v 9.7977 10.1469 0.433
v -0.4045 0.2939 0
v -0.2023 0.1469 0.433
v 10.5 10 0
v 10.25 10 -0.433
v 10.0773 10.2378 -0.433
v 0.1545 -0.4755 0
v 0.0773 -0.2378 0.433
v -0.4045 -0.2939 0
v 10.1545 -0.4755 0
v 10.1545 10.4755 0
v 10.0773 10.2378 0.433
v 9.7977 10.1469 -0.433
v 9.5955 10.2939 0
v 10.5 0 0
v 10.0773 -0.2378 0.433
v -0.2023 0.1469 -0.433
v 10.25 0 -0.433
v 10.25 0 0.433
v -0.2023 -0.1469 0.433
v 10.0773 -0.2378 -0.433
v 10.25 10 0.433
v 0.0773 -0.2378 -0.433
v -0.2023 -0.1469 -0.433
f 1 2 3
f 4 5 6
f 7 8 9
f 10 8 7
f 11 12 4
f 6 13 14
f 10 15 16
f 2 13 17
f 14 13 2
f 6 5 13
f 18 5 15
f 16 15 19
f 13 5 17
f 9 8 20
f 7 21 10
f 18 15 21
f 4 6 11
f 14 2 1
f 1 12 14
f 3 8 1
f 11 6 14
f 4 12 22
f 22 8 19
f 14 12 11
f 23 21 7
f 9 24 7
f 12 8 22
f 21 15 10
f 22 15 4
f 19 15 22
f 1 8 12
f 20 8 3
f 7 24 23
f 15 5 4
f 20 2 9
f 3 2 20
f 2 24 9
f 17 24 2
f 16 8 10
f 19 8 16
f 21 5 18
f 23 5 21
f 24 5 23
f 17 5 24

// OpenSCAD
$fn=5;
hull()
{
	translate([0,0,0])
	{
		rotate(0,[0,0,1])
		{
			sphere(d=1);
		}
	}
	translate([10,0,0])
	{
		rotate(0,[0,0,1])
		{
			sphere(d=1);
		}
	}
	translate([10,10,0])
	{
		rotate(0,[0,0,1])
		{
			sphere(d=1);
		}
	}
}
